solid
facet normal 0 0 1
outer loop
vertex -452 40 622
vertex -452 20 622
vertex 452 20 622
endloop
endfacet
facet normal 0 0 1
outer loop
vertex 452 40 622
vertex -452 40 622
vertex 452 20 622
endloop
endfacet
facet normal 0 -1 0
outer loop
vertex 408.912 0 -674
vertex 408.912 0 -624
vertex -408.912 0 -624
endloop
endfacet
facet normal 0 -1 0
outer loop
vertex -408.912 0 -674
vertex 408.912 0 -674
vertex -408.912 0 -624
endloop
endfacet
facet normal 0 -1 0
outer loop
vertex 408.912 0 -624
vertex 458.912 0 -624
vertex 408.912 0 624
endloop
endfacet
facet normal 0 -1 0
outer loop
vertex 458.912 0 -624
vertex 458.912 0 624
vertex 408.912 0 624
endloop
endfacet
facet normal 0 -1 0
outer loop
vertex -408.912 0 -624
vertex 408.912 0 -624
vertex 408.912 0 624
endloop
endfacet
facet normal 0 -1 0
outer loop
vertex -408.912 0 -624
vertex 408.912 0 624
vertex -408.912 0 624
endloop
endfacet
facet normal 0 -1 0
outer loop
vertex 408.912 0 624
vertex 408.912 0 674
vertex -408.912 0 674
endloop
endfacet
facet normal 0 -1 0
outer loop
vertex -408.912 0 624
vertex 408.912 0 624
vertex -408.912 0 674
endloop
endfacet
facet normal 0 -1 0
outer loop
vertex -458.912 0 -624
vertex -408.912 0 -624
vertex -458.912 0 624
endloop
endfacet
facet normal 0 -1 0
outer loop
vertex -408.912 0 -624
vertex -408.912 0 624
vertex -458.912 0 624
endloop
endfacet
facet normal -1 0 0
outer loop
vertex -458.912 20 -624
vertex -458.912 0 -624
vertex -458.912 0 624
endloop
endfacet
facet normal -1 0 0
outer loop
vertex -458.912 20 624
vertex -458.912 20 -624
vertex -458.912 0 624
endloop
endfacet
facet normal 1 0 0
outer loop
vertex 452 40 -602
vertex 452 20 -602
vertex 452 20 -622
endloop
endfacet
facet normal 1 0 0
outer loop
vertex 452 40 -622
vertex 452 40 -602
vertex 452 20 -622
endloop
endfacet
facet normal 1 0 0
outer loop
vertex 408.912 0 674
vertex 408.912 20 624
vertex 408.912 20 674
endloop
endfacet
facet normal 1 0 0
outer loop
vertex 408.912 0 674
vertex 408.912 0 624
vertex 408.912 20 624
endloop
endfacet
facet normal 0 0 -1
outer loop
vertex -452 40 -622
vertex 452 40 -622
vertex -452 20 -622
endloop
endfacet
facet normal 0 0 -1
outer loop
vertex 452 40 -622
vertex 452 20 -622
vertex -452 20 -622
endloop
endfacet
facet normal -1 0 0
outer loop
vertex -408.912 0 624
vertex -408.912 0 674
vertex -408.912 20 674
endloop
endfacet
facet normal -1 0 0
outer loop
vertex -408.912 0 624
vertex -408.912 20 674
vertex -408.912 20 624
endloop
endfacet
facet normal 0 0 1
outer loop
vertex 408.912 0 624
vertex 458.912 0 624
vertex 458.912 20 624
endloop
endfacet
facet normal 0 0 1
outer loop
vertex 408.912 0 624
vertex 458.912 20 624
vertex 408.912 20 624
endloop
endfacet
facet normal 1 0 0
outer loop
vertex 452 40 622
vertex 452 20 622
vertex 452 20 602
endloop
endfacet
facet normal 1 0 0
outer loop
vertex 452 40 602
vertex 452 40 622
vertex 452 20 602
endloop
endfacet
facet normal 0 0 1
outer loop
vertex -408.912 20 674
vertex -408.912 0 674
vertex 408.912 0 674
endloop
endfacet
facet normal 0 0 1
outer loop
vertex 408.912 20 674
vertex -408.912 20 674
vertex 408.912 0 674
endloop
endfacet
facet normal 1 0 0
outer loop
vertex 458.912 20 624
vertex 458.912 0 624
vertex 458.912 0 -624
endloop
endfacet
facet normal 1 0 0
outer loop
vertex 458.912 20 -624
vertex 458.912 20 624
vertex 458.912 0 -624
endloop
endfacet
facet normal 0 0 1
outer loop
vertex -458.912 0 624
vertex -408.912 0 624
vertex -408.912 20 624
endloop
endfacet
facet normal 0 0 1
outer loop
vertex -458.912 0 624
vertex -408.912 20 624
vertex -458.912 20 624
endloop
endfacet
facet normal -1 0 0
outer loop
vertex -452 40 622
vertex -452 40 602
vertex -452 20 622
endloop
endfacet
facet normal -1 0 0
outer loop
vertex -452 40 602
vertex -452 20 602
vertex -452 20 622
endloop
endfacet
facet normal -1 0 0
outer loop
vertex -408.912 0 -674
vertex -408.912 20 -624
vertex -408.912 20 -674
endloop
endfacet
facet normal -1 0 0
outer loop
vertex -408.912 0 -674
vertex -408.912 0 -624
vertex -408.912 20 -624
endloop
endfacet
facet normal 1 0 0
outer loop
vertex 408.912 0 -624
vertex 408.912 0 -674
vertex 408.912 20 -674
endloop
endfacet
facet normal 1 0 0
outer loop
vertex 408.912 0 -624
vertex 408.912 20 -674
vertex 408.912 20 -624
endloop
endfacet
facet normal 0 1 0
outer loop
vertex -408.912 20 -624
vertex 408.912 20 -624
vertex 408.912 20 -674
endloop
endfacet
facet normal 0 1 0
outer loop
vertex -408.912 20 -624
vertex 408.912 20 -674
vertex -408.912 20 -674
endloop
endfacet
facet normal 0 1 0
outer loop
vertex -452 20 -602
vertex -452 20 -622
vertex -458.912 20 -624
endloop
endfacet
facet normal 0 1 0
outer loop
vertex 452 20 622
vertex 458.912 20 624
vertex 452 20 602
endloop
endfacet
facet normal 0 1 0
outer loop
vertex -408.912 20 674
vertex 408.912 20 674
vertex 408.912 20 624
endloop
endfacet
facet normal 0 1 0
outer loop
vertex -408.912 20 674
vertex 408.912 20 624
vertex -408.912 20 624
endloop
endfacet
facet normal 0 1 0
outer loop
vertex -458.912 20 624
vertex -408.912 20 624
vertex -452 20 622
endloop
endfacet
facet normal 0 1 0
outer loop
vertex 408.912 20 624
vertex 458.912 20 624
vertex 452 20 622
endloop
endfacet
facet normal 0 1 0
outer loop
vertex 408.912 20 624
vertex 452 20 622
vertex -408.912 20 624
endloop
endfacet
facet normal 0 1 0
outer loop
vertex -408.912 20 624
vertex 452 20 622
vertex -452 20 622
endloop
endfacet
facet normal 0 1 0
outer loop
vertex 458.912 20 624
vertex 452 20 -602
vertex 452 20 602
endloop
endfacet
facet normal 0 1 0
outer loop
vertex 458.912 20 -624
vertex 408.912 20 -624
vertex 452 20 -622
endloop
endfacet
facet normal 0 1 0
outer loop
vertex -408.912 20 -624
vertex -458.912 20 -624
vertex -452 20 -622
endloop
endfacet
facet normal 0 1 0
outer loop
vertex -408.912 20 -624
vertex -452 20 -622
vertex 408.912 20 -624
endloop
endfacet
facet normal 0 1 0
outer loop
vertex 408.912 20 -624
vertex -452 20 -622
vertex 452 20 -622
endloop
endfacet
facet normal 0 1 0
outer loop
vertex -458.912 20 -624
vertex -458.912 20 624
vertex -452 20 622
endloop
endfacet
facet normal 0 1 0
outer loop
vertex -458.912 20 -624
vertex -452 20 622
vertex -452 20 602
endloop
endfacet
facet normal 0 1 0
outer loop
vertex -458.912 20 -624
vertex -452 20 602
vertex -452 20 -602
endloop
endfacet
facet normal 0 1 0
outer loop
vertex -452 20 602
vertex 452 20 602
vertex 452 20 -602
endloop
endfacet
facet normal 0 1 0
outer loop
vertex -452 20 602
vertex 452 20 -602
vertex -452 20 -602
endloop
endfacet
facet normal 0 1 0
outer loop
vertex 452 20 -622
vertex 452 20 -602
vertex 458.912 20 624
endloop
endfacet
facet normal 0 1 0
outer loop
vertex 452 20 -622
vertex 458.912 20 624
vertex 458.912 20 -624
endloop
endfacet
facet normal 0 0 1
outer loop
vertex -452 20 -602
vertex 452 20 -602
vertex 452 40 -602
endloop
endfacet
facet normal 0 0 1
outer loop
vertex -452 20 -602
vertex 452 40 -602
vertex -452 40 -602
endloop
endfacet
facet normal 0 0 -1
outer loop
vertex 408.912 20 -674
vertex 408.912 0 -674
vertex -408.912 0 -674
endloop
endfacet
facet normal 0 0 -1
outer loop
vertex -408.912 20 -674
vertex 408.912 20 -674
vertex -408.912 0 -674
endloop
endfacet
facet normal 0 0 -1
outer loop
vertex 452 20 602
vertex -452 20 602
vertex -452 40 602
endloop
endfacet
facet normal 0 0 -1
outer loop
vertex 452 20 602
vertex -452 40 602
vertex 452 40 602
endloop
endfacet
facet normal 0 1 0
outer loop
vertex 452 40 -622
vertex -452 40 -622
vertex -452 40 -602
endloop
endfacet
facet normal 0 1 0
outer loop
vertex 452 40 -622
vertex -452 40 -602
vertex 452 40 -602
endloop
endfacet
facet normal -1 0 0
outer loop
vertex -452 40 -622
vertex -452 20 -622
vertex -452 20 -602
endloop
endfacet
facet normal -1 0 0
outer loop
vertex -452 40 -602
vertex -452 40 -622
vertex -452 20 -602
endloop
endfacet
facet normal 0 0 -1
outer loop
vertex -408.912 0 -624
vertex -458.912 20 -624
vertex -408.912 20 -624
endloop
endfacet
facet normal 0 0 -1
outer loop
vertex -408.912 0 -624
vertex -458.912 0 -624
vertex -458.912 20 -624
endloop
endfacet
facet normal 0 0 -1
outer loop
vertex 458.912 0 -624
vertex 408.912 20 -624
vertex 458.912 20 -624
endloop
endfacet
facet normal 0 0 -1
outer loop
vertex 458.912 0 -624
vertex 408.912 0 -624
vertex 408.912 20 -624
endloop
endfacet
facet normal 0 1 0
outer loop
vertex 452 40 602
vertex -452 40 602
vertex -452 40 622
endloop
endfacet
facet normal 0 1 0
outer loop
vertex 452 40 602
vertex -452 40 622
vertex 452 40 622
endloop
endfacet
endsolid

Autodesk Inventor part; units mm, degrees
ref_plane "YZ Plane" through (0, 0, 0) normal (1, 0, 0) x (0, 1, 0)
ref_plane "XZ Plane" through (0, 0, 0) normal (0, 1, 0) x (-1, 0, 0)
ref_plane "XY Plane" through (0, 0, 0) normal (0, 0, 1) x (1, 0, 0)
sketch "Sketch1" plane through (0, 0, 0) normal (0, 1, 0) x (-1, 0, 0)
  line L0 (408.912, 674) -> (-408.912, 674)
  line L1 (-458.912, 624) -> (-458.912, -624)
  line L2 (-408.912, -674) -> (408.912, -674)
  line L3 (458.912, -624) -> (458.912, 624)
  line L4 (458.912, 674) -> (-458.912, -674) construction
  line L5 (408.912, 674) -> (408.912, 624)
  line L6 (408.912, 624) -> (458.912, 624)
  line L7 (458.912, 674) -> (408.912, 624) construction
  line L8 (408.912, 674) -> (458.912, 624) construction
  line L9 (-458.912, 624) -> (-408.912, 624)
  line L10 (-408.912, 624) -> (-408.912, 674)
  line L11 (-408.912, 674) -> (-458.912, 624) construction
  line L12 (-458.912, 674) -> (-408.912, 624) construction
  line L13 (458.912, -624) -> (408.912, -624)
  line L14 (408.912, -624) -> (408.912, -674)
  line L15 (458.912, -624) -> (408.912, -674) construction
  line L16 (408.912, -624) -> (458.912, -674) construction
  line L17 (-408.912, -624) -> (-458.912, -624)
  line L18 (-408.912, -674) -> (-408.912, -624)
  line L19 (-408.912, -624) -> (-458.912, -674) construction
  line L20 (-458.912, -624) -> (-408.912, -674) construction
  point P0 (0, 0)
  point P1 (433.912, 649)
  point P2 (-433.912, 649)
  point P3 (433.912, -649)
  point P4 (-433.912, -649)
extrude "Extrusion1" add sketch "Sketch1" along normal blind 20
sketch "Sketch2" plane through (0, 20, 0) normal (0, 1, 0) x (1, 0, 0)
  line L0 (452, 602) -> (-452, 602)
  line L1 (-452, -602) -> (452, -602)
  line L2 (452, 602) -> (-452, -602) construction
  line L3 (-452, 602) -> (452, -602) construction
  line L4 (452, 622) -> (-452, 622)
  line L5 (-452, -622) -> (452, -622)
  line L6 (452, 622) -> (-452, -622) construction
  line L7 (-452, 622) -> (452, -622) construction
  line L8 (452, -622) -> (452, -602)
  line L9 (452, 602) -> (452, 622)
  line L10 (-452, 622) -> (-452, 602)
  line L11 (-452, -602) -> (-452, -622)
  point P0 (0, 0)
extrude "Extrusion2" add sketch "Sketch2" along normal blind 20
properties part number "tub floor 2"
